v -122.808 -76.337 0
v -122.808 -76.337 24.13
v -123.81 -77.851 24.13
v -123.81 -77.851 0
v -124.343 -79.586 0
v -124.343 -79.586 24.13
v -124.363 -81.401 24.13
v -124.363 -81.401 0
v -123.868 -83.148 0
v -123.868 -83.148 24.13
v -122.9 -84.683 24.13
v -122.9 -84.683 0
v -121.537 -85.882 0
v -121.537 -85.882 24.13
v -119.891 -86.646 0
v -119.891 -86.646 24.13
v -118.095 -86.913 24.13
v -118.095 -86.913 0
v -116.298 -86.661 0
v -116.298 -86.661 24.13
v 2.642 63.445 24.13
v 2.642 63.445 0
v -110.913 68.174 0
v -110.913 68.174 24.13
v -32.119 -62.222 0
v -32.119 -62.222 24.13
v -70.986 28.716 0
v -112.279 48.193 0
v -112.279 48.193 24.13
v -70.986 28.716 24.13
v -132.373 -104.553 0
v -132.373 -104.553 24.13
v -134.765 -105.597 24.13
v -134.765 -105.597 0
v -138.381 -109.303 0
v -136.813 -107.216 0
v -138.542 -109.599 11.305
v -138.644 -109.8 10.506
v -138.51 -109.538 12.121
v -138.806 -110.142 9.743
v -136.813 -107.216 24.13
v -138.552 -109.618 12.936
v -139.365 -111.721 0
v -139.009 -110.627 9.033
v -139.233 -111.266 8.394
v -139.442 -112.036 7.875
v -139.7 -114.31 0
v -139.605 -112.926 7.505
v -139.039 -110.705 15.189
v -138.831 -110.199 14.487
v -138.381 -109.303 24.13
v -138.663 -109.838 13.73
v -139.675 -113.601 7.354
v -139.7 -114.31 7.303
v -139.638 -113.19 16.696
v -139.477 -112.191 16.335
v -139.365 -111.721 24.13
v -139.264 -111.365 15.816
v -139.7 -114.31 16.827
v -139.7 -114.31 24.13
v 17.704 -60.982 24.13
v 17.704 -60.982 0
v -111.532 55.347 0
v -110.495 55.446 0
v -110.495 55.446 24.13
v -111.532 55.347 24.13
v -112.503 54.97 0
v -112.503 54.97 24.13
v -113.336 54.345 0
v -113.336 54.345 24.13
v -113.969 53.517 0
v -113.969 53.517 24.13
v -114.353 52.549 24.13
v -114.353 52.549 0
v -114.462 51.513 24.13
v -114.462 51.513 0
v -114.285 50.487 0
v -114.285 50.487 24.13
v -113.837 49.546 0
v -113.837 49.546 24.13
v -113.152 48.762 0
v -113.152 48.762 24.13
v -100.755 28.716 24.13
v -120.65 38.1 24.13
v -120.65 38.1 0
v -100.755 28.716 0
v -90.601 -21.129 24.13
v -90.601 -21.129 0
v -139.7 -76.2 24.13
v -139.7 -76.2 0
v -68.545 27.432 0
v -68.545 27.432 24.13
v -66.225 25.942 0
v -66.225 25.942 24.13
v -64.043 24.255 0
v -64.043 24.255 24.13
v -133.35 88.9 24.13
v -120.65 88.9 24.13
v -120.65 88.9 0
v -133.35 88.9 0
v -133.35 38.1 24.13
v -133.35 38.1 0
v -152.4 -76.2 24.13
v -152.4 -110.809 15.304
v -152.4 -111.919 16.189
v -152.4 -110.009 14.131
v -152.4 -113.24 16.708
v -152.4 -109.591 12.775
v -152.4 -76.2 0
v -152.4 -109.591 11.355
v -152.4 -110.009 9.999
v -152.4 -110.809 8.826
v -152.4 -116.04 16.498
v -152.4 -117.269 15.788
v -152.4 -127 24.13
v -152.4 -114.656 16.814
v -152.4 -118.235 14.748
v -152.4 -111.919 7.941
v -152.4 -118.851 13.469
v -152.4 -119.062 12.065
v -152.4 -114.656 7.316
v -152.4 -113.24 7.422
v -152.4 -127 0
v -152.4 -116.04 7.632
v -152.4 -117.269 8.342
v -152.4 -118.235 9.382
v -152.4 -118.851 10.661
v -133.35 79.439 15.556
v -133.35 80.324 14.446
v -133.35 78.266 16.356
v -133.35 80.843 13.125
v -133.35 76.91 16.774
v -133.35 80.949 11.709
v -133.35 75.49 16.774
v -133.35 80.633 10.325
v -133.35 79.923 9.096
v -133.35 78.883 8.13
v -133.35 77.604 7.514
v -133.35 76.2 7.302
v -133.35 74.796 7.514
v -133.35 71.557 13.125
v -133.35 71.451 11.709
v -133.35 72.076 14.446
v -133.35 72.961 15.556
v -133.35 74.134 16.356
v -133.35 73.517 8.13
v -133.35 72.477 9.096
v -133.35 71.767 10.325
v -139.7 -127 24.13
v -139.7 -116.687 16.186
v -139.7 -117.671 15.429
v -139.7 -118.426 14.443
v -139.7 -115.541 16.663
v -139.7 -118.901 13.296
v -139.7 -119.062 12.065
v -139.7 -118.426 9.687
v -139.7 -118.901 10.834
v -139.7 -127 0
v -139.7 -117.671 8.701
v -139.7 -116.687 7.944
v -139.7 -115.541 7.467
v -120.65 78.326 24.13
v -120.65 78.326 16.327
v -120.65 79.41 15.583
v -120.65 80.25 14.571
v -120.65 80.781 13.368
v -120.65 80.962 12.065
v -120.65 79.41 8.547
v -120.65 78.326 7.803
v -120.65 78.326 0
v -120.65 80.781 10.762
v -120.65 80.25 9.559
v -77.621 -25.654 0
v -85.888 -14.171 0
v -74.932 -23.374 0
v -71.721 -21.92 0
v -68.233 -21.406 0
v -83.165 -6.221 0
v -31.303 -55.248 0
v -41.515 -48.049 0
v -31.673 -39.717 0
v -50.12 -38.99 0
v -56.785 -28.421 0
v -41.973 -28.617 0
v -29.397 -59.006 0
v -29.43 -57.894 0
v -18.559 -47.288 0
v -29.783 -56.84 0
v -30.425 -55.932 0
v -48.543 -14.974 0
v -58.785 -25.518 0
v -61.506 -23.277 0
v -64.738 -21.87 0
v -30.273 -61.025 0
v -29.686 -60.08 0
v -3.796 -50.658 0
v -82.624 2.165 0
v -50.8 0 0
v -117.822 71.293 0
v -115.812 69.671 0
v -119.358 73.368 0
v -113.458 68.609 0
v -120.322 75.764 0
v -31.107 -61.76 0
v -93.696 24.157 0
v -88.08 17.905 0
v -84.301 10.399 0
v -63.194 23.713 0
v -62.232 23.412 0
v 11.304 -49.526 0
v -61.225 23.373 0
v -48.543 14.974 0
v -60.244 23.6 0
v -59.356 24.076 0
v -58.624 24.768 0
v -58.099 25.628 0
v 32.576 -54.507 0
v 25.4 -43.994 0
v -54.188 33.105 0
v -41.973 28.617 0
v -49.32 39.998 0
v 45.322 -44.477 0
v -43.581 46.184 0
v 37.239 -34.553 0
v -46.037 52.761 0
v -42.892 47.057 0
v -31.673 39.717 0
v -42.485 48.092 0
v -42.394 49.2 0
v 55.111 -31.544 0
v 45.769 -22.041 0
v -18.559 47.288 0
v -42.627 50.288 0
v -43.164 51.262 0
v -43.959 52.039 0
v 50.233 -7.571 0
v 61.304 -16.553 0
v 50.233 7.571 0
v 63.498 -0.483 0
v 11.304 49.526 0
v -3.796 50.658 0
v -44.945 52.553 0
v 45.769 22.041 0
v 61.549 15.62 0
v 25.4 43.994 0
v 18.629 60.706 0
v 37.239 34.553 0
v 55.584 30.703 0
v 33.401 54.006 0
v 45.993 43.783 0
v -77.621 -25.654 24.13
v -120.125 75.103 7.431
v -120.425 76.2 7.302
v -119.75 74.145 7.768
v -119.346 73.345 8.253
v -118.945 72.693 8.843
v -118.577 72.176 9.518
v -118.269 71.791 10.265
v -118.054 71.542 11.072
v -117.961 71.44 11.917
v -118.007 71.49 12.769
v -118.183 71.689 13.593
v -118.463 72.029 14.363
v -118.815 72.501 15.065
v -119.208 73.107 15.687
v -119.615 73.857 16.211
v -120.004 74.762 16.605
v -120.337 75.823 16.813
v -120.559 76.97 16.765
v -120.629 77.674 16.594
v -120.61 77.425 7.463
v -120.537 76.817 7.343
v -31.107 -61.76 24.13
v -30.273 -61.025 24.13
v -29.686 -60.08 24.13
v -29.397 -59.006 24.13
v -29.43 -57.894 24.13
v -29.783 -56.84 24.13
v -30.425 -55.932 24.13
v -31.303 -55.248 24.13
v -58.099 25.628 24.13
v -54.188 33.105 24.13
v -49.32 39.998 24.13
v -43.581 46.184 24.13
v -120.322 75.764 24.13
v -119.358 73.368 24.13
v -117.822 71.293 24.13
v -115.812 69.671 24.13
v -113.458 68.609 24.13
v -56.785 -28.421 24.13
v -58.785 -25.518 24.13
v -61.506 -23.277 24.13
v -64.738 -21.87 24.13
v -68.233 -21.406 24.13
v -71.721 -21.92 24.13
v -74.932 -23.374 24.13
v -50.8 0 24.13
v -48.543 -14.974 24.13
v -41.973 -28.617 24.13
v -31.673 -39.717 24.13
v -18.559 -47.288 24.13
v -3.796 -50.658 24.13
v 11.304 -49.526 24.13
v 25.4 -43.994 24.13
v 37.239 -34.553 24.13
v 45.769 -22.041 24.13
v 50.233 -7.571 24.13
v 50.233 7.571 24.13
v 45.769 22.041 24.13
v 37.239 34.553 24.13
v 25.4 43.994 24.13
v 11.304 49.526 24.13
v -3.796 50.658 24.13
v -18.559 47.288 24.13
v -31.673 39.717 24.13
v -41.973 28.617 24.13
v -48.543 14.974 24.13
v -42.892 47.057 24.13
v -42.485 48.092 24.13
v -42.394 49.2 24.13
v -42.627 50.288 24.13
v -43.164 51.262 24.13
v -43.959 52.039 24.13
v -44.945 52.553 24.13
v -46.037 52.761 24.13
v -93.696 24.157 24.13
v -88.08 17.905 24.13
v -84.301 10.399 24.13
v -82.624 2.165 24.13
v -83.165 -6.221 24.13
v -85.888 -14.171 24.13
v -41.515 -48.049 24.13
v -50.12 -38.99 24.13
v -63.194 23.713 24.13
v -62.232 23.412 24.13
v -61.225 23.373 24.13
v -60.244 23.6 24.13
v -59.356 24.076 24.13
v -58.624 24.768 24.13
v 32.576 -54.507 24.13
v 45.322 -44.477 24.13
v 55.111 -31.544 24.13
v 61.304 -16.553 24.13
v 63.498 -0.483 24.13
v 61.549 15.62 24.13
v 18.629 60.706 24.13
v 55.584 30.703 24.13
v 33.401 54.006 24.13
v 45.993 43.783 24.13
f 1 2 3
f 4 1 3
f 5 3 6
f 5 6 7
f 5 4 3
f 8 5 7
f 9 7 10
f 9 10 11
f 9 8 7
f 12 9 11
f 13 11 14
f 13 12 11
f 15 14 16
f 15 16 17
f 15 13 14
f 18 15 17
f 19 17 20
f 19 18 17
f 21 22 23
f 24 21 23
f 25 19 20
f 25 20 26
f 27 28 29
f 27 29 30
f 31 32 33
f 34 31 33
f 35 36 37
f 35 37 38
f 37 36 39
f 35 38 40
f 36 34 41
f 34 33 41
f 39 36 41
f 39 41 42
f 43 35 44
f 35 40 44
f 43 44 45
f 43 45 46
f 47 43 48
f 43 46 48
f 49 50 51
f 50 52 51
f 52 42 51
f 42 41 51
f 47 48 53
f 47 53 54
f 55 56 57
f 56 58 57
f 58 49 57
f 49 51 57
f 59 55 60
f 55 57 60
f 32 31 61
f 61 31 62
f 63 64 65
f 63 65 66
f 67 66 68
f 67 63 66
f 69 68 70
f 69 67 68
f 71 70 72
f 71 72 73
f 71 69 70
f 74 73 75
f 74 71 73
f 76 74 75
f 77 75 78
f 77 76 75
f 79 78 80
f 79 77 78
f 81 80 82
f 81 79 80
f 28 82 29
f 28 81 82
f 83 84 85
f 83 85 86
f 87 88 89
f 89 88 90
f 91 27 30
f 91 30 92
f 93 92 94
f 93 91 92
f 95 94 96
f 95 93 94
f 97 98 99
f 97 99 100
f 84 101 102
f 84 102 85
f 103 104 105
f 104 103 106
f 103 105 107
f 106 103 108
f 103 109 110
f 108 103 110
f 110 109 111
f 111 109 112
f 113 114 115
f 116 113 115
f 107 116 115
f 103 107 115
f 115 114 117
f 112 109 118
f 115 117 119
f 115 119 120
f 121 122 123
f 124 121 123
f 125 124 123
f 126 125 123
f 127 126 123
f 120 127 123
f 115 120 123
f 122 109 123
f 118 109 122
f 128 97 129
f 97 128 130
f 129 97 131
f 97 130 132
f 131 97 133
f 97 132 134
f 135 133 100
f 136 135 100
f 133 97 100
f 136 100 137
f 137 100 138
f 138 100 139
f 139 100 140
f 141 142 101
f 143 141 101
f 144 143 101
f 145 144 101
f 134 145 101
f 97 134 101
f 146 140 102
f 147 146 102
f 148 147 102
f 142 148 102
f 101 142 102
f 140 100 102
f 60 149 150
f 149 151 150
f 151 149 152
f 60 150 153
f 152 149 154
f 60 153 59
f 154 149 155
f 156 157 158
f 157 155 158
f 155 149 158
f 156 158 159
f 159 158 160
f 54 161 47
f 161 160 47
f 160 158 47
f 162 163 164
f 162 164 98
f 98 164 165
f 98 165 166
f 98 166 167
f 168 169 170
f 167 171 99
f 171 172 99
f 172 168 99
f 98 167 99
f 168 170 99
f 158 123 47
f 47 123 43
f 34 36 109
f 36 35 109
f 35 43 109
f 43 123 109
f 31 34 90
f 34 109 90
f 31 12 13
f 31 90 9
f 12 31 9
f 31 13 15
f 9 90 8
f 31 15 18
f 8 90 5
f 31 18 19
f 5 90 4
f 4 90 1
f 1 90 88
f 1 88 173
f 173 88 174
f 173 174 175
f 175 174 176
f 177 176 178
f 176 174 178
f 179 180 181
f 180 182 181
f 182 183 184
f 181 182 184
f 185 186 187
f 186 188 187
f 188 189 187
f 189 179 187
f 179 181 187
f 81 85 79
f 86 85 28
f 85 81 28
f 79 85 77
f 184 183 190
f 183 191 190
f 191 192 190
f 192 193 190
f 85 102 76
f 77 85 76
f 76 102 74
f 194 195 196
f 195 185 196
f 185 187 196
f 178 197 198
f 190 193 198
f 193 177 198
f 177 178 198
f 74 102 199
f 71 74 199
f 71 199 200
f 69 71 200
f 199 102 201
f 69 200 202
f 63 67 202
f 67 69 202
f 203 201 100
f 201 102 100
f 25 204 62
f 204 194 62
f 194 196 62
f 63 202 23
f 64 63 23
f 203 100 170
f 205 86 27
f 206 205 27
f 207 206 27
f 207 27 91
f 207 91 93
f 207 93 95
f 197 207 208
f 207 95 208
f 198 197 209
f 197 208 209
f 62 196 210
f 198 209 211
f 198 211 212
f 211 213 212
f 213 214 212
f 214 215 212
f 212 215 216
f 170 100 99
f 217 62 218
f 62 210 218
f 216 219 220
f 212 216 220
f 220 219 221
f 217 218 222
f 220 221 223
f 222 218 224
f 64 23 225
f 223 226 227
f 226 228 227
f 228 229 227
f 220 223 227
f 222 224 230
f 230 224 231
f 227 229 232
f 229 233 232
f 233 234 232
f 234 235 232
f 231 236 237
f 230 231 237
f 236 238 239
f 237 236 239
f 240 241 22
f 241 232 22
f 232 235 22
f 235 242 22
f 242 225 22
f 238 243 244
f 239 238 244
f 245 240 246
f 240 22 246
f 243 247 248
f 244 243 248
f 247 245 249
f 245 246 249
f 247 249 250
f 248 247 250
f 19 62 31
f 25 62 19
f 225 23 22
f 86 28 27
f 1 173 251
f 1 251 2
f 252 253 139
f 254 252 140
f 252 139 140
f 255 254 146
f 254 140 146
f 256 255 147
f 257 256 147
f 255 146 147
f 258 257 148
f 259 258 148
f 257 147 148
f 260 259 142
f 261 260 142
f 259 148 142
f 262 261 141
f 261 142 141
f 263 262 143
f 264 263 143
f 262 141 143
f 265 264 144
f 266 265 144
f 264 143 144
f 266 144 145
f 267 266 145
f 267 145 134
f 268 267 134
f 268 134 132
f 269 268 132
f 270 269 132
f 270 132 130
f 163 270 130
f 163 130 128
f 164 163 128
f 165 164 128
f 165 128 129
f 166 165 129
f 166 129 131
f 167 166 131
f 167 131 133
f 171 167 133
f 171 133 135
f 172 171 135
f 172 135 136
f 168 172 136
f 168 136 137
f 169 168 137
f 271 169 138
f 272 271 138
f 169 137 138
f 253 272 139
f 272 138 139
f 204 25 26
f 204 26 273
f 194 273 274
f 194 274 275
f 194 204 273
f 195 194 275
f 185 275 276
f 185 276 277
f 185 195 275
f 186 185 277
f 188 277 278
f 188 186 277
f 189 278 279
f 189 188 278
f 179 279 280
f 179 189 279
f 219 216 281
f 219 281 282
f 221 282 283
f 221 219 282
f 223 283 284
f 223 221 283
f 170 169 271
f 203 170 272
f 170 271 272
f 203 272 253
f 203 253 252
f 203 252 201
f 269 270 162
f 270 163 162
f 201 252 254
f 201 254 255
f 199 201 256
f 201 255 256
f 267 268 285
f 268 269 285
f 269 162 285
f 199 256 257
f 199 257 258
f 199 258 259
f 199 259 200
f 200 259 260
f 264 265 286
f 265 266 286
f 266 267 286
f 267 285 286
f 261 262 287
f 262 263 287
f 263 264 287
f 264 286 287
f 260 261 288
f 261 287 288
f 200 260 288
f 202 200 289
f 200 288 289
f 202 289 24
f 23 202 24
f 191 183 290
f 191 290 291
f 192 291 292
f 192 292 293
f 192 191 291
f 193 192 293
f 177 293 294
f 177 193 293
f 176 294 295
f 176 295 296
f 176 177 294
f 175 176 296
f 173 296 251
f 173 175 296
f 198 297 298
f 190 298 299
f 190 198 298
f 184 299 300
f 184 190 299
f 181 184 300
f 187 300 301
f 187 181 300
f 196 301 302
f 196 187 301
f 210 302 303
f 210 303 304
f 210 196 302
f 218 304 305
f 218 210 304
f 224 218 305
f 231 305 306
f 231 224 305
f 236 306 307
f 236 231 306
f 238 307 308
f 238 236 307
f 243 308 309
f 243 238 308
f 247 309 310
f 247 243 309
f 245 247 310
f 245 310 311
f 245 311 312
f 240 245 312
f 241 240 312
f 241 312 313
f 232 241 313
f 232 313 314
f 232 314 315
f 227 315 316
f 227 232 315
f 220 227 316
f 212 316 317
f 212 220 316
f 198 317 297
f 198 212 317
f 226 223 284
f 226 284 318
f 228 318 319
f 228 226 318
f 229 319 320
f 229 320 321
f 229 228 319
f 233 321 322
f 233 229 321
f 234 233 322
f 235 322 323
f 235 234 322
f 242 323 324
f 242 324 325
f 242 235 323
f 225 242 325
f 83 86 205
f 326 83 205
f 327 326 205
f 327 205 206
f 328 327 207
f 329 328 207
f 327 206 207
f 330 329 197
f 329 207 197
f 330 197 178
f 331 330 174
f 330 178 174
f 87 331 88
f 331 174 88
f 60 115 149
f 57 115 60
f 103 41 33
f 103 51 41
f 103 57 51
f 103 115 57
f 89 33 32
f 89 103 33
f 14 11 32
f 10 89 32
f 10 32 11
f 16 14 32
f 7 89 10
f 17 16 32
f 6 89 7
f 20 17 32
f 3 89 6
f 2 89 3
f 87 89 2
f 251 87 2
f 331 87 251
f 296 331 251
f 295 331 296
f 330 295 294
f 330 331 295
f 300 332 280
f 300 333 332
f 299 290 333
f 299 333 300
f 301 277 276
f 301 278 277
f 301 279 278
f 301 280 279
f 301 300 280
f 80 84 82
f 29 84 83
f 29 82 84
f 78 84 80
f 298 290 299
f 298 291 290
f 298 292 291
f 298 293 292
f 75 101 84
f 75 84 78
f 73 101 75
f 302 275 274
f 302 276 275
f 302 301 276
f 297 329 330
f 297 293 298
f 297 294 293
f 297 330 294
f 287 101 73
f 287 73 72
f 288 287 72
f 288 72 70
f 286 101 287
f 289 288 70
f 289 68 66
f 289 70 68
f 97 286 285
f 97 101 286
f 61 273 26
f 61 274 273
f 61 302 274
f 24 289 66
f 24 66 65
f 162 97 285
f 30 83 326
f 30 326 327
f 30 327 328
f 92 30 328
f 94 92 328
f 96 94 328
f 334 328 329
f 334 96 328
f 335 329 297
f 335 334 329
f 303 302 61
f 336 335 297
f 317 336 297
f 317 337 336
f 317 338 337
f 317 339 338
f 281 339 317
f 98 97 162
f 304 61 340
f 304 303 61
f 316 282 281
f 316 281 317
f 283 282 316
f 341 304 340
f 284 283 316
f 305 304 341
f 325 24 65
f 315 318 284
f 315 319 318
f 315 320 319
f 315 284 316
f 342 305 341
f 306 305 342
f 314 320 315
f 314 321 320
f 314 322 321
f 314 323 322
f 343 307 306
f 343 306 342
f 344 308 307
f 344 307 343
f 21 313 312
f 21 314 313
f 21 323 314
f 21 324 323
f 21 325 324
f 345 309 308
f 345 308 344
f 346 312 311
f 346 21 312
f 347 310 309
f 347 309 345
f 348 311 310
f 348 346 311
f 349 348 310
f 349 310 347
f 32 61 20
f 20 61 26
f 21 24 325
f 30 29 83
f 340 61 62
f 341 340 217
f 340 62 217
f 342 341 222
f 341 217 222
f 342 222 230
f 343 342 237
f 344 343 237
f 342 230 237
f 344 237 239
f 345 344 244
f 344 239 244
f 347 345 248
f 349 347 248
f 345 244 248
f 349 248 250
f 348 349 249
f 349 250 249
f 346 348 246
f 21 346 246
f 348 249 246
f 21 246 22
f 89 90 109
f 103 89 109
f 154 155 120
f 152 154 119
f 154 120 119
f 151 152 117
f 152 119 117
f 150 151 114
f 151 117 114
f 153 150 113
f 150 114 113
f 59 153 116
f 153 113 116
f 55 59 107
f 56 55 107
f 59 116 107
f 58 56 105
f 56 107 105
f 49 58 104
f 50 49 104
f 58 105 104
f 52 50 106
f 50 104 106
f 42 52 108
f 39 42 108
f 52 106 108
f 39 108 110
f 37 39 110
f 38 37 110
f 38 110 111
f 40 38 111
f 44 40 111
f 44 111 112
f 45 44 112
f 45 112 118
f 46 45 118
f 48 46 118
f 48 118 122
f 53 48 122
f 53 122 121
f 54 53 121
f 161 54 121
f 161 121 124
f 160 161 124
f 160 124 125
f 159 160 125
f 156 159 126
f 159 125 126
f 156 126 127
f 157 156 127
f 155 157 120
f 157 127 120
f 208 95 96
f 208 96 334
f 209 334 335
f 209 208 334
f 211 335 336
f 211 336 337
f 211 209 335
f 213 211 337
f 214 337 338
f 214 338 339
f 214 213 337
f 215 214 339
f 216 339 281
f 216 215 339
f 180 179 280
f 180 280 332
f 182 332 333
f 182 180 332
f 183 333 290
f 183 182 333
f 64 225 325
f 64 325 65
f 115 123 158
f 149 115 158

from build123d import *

# Parameters (mm, degrees)
SKETCH1_R           = 50.8
BOSS_EXTRUDE1_DEPTH = 24.13
FILLET1_R           = 10.16
SKETCH2_R           = 4.7625
CUT_EXTRUDE1_DEPTH  = 252.642736633


with BuildPart() as part:
    # Sketch1 → Boss-Extrude1 (new body)
    with BuildSketch(Plane.XY):
        with BuildLine():
            Line((-133.35, 88.9), (-133.35, 38.1))
            Line((-133.35, 38.1), (-120.65, 38.1))
            Line((-120.65, 38.1), (-100.755098441, 28.715816927))
            ThreePointArc((-100.755098441, 28.715816927), (-83.188973521, 6.337707108), (-90.601125221, -21.128791593))
            Line((-90.601125221, -21.128791593), (-139.7, -76.2))
            Line((-139.7, -76.2), (-152.4, -76.2))
            Line((-152.4, -76.2), (-152.4, -127))
            Line((-152.4, -127), (-139.7, -127))
            Line((-139.7, -127), (-139.7, -106.68))
            Line((-139.7, -106.68), (17.704429235, -60.981990665))
            ThreePointArc((17.704429235, -60.981990665), (63.039807772, 7.631031129), (2.642419241, 63.444996813))
            Line((2.642419241, 63.444996813), (-120.65, 68.58))
            Line((-120.65, 68.58), (-120.65, 88.9))
            Line((-120.65, 88.9), (-133.35, 88.9))
        make_face()
        with Locations(Location((0, 0, 0), (0, 0, 180))):
            Circle(SKETCH1_R, mode=Mode.SUBTRACT)
        with BuildLine():
            Line((-46.037431664, 52.76145265), (-110.49514893, 55.446050662))
            ThreePointArc((-110.49514893, 55.446050662), (-114.353417179, 52.549377789), (-112.279082271, 48.193452823))
            Line((-112.279082271, 48.193452823), (-70.985594525, 28.715816927))
            ThreePointArc((-70.985594525, 28.715816927), (-67.368742902, 26.71210826), (-64.042949916, 24.25536955))
            ThreePointArc((-64.042949916, 24.25536955), (-60.727043781, 23.453741785), (-58.09853243, 25.628314996))
            ThreePointArc((-58.09853243, 25.628314996), (-51.868282156, 36.632380569), (-43.581110206, 46.183729096))
            ThreePointArc((-43.581110206, 46.183729096), (-42.626724096, 50.287620053), (-46.037431664, 52.76145265))
        make_face(mode=Mode.SUBTRACT)
        with BuildLine():
            Line((-77.6210071, -25.653934719), (-122.808045193, -76.337474888))
            ThreePointArc((-122.808045193, -76.337474888), (-123.43951378, -83.950303149), (-116.297827314, -86.661432273))
            Line((-116.297827314, -86.661432273), (-32.118533433, -62.222309585))
            ThreePointArc((-32.118533433, -62.222309585), (-29.396609186, -59.006115837), (-31.302640742, -55.248481269))
            ThreePointArc((-31.302640742, -55.248481269), (-46.04089289, -43.731981225), (-56.784547657, -28.421209464))
            ThreePointArc((-56.784547657, -28.421209464), (-66.469460728, -21.515994345), (-77.6210071, -25.653934719))
        make_face(mode=Mode.SUBTRACT)
    extrude(amount=BOSS_EXTRUDE1_DEPTH)

    # Fillet1
    fillet1_edges = [part.edges().sort_by_distance(p)[0] for p in [
        (-120.65, 68.58, 12.065),
        (-139.7, -106.68, 12.065),
    ]]
    fillet(fillet1_edges, radius=FILLET1_R)

    # Sketch2 → Cut-Extrude1 (cut, through all)
    with BuildSketch(Plane.ZY.offset(152.4)):
        with Locations(Location((12.065, -114.3, 0), (0, 0, 270))):
            Circle(SKETCH2_R)
        with Locations(Location((12.065, 76.2, 0), (0, 0, 180))):
            Circle(SKETCH2_R)
    extrude(amount=-CUT_EXTRUDE1_DEPTH, mode=Mode.SUBTRACT)


solid = part.part
